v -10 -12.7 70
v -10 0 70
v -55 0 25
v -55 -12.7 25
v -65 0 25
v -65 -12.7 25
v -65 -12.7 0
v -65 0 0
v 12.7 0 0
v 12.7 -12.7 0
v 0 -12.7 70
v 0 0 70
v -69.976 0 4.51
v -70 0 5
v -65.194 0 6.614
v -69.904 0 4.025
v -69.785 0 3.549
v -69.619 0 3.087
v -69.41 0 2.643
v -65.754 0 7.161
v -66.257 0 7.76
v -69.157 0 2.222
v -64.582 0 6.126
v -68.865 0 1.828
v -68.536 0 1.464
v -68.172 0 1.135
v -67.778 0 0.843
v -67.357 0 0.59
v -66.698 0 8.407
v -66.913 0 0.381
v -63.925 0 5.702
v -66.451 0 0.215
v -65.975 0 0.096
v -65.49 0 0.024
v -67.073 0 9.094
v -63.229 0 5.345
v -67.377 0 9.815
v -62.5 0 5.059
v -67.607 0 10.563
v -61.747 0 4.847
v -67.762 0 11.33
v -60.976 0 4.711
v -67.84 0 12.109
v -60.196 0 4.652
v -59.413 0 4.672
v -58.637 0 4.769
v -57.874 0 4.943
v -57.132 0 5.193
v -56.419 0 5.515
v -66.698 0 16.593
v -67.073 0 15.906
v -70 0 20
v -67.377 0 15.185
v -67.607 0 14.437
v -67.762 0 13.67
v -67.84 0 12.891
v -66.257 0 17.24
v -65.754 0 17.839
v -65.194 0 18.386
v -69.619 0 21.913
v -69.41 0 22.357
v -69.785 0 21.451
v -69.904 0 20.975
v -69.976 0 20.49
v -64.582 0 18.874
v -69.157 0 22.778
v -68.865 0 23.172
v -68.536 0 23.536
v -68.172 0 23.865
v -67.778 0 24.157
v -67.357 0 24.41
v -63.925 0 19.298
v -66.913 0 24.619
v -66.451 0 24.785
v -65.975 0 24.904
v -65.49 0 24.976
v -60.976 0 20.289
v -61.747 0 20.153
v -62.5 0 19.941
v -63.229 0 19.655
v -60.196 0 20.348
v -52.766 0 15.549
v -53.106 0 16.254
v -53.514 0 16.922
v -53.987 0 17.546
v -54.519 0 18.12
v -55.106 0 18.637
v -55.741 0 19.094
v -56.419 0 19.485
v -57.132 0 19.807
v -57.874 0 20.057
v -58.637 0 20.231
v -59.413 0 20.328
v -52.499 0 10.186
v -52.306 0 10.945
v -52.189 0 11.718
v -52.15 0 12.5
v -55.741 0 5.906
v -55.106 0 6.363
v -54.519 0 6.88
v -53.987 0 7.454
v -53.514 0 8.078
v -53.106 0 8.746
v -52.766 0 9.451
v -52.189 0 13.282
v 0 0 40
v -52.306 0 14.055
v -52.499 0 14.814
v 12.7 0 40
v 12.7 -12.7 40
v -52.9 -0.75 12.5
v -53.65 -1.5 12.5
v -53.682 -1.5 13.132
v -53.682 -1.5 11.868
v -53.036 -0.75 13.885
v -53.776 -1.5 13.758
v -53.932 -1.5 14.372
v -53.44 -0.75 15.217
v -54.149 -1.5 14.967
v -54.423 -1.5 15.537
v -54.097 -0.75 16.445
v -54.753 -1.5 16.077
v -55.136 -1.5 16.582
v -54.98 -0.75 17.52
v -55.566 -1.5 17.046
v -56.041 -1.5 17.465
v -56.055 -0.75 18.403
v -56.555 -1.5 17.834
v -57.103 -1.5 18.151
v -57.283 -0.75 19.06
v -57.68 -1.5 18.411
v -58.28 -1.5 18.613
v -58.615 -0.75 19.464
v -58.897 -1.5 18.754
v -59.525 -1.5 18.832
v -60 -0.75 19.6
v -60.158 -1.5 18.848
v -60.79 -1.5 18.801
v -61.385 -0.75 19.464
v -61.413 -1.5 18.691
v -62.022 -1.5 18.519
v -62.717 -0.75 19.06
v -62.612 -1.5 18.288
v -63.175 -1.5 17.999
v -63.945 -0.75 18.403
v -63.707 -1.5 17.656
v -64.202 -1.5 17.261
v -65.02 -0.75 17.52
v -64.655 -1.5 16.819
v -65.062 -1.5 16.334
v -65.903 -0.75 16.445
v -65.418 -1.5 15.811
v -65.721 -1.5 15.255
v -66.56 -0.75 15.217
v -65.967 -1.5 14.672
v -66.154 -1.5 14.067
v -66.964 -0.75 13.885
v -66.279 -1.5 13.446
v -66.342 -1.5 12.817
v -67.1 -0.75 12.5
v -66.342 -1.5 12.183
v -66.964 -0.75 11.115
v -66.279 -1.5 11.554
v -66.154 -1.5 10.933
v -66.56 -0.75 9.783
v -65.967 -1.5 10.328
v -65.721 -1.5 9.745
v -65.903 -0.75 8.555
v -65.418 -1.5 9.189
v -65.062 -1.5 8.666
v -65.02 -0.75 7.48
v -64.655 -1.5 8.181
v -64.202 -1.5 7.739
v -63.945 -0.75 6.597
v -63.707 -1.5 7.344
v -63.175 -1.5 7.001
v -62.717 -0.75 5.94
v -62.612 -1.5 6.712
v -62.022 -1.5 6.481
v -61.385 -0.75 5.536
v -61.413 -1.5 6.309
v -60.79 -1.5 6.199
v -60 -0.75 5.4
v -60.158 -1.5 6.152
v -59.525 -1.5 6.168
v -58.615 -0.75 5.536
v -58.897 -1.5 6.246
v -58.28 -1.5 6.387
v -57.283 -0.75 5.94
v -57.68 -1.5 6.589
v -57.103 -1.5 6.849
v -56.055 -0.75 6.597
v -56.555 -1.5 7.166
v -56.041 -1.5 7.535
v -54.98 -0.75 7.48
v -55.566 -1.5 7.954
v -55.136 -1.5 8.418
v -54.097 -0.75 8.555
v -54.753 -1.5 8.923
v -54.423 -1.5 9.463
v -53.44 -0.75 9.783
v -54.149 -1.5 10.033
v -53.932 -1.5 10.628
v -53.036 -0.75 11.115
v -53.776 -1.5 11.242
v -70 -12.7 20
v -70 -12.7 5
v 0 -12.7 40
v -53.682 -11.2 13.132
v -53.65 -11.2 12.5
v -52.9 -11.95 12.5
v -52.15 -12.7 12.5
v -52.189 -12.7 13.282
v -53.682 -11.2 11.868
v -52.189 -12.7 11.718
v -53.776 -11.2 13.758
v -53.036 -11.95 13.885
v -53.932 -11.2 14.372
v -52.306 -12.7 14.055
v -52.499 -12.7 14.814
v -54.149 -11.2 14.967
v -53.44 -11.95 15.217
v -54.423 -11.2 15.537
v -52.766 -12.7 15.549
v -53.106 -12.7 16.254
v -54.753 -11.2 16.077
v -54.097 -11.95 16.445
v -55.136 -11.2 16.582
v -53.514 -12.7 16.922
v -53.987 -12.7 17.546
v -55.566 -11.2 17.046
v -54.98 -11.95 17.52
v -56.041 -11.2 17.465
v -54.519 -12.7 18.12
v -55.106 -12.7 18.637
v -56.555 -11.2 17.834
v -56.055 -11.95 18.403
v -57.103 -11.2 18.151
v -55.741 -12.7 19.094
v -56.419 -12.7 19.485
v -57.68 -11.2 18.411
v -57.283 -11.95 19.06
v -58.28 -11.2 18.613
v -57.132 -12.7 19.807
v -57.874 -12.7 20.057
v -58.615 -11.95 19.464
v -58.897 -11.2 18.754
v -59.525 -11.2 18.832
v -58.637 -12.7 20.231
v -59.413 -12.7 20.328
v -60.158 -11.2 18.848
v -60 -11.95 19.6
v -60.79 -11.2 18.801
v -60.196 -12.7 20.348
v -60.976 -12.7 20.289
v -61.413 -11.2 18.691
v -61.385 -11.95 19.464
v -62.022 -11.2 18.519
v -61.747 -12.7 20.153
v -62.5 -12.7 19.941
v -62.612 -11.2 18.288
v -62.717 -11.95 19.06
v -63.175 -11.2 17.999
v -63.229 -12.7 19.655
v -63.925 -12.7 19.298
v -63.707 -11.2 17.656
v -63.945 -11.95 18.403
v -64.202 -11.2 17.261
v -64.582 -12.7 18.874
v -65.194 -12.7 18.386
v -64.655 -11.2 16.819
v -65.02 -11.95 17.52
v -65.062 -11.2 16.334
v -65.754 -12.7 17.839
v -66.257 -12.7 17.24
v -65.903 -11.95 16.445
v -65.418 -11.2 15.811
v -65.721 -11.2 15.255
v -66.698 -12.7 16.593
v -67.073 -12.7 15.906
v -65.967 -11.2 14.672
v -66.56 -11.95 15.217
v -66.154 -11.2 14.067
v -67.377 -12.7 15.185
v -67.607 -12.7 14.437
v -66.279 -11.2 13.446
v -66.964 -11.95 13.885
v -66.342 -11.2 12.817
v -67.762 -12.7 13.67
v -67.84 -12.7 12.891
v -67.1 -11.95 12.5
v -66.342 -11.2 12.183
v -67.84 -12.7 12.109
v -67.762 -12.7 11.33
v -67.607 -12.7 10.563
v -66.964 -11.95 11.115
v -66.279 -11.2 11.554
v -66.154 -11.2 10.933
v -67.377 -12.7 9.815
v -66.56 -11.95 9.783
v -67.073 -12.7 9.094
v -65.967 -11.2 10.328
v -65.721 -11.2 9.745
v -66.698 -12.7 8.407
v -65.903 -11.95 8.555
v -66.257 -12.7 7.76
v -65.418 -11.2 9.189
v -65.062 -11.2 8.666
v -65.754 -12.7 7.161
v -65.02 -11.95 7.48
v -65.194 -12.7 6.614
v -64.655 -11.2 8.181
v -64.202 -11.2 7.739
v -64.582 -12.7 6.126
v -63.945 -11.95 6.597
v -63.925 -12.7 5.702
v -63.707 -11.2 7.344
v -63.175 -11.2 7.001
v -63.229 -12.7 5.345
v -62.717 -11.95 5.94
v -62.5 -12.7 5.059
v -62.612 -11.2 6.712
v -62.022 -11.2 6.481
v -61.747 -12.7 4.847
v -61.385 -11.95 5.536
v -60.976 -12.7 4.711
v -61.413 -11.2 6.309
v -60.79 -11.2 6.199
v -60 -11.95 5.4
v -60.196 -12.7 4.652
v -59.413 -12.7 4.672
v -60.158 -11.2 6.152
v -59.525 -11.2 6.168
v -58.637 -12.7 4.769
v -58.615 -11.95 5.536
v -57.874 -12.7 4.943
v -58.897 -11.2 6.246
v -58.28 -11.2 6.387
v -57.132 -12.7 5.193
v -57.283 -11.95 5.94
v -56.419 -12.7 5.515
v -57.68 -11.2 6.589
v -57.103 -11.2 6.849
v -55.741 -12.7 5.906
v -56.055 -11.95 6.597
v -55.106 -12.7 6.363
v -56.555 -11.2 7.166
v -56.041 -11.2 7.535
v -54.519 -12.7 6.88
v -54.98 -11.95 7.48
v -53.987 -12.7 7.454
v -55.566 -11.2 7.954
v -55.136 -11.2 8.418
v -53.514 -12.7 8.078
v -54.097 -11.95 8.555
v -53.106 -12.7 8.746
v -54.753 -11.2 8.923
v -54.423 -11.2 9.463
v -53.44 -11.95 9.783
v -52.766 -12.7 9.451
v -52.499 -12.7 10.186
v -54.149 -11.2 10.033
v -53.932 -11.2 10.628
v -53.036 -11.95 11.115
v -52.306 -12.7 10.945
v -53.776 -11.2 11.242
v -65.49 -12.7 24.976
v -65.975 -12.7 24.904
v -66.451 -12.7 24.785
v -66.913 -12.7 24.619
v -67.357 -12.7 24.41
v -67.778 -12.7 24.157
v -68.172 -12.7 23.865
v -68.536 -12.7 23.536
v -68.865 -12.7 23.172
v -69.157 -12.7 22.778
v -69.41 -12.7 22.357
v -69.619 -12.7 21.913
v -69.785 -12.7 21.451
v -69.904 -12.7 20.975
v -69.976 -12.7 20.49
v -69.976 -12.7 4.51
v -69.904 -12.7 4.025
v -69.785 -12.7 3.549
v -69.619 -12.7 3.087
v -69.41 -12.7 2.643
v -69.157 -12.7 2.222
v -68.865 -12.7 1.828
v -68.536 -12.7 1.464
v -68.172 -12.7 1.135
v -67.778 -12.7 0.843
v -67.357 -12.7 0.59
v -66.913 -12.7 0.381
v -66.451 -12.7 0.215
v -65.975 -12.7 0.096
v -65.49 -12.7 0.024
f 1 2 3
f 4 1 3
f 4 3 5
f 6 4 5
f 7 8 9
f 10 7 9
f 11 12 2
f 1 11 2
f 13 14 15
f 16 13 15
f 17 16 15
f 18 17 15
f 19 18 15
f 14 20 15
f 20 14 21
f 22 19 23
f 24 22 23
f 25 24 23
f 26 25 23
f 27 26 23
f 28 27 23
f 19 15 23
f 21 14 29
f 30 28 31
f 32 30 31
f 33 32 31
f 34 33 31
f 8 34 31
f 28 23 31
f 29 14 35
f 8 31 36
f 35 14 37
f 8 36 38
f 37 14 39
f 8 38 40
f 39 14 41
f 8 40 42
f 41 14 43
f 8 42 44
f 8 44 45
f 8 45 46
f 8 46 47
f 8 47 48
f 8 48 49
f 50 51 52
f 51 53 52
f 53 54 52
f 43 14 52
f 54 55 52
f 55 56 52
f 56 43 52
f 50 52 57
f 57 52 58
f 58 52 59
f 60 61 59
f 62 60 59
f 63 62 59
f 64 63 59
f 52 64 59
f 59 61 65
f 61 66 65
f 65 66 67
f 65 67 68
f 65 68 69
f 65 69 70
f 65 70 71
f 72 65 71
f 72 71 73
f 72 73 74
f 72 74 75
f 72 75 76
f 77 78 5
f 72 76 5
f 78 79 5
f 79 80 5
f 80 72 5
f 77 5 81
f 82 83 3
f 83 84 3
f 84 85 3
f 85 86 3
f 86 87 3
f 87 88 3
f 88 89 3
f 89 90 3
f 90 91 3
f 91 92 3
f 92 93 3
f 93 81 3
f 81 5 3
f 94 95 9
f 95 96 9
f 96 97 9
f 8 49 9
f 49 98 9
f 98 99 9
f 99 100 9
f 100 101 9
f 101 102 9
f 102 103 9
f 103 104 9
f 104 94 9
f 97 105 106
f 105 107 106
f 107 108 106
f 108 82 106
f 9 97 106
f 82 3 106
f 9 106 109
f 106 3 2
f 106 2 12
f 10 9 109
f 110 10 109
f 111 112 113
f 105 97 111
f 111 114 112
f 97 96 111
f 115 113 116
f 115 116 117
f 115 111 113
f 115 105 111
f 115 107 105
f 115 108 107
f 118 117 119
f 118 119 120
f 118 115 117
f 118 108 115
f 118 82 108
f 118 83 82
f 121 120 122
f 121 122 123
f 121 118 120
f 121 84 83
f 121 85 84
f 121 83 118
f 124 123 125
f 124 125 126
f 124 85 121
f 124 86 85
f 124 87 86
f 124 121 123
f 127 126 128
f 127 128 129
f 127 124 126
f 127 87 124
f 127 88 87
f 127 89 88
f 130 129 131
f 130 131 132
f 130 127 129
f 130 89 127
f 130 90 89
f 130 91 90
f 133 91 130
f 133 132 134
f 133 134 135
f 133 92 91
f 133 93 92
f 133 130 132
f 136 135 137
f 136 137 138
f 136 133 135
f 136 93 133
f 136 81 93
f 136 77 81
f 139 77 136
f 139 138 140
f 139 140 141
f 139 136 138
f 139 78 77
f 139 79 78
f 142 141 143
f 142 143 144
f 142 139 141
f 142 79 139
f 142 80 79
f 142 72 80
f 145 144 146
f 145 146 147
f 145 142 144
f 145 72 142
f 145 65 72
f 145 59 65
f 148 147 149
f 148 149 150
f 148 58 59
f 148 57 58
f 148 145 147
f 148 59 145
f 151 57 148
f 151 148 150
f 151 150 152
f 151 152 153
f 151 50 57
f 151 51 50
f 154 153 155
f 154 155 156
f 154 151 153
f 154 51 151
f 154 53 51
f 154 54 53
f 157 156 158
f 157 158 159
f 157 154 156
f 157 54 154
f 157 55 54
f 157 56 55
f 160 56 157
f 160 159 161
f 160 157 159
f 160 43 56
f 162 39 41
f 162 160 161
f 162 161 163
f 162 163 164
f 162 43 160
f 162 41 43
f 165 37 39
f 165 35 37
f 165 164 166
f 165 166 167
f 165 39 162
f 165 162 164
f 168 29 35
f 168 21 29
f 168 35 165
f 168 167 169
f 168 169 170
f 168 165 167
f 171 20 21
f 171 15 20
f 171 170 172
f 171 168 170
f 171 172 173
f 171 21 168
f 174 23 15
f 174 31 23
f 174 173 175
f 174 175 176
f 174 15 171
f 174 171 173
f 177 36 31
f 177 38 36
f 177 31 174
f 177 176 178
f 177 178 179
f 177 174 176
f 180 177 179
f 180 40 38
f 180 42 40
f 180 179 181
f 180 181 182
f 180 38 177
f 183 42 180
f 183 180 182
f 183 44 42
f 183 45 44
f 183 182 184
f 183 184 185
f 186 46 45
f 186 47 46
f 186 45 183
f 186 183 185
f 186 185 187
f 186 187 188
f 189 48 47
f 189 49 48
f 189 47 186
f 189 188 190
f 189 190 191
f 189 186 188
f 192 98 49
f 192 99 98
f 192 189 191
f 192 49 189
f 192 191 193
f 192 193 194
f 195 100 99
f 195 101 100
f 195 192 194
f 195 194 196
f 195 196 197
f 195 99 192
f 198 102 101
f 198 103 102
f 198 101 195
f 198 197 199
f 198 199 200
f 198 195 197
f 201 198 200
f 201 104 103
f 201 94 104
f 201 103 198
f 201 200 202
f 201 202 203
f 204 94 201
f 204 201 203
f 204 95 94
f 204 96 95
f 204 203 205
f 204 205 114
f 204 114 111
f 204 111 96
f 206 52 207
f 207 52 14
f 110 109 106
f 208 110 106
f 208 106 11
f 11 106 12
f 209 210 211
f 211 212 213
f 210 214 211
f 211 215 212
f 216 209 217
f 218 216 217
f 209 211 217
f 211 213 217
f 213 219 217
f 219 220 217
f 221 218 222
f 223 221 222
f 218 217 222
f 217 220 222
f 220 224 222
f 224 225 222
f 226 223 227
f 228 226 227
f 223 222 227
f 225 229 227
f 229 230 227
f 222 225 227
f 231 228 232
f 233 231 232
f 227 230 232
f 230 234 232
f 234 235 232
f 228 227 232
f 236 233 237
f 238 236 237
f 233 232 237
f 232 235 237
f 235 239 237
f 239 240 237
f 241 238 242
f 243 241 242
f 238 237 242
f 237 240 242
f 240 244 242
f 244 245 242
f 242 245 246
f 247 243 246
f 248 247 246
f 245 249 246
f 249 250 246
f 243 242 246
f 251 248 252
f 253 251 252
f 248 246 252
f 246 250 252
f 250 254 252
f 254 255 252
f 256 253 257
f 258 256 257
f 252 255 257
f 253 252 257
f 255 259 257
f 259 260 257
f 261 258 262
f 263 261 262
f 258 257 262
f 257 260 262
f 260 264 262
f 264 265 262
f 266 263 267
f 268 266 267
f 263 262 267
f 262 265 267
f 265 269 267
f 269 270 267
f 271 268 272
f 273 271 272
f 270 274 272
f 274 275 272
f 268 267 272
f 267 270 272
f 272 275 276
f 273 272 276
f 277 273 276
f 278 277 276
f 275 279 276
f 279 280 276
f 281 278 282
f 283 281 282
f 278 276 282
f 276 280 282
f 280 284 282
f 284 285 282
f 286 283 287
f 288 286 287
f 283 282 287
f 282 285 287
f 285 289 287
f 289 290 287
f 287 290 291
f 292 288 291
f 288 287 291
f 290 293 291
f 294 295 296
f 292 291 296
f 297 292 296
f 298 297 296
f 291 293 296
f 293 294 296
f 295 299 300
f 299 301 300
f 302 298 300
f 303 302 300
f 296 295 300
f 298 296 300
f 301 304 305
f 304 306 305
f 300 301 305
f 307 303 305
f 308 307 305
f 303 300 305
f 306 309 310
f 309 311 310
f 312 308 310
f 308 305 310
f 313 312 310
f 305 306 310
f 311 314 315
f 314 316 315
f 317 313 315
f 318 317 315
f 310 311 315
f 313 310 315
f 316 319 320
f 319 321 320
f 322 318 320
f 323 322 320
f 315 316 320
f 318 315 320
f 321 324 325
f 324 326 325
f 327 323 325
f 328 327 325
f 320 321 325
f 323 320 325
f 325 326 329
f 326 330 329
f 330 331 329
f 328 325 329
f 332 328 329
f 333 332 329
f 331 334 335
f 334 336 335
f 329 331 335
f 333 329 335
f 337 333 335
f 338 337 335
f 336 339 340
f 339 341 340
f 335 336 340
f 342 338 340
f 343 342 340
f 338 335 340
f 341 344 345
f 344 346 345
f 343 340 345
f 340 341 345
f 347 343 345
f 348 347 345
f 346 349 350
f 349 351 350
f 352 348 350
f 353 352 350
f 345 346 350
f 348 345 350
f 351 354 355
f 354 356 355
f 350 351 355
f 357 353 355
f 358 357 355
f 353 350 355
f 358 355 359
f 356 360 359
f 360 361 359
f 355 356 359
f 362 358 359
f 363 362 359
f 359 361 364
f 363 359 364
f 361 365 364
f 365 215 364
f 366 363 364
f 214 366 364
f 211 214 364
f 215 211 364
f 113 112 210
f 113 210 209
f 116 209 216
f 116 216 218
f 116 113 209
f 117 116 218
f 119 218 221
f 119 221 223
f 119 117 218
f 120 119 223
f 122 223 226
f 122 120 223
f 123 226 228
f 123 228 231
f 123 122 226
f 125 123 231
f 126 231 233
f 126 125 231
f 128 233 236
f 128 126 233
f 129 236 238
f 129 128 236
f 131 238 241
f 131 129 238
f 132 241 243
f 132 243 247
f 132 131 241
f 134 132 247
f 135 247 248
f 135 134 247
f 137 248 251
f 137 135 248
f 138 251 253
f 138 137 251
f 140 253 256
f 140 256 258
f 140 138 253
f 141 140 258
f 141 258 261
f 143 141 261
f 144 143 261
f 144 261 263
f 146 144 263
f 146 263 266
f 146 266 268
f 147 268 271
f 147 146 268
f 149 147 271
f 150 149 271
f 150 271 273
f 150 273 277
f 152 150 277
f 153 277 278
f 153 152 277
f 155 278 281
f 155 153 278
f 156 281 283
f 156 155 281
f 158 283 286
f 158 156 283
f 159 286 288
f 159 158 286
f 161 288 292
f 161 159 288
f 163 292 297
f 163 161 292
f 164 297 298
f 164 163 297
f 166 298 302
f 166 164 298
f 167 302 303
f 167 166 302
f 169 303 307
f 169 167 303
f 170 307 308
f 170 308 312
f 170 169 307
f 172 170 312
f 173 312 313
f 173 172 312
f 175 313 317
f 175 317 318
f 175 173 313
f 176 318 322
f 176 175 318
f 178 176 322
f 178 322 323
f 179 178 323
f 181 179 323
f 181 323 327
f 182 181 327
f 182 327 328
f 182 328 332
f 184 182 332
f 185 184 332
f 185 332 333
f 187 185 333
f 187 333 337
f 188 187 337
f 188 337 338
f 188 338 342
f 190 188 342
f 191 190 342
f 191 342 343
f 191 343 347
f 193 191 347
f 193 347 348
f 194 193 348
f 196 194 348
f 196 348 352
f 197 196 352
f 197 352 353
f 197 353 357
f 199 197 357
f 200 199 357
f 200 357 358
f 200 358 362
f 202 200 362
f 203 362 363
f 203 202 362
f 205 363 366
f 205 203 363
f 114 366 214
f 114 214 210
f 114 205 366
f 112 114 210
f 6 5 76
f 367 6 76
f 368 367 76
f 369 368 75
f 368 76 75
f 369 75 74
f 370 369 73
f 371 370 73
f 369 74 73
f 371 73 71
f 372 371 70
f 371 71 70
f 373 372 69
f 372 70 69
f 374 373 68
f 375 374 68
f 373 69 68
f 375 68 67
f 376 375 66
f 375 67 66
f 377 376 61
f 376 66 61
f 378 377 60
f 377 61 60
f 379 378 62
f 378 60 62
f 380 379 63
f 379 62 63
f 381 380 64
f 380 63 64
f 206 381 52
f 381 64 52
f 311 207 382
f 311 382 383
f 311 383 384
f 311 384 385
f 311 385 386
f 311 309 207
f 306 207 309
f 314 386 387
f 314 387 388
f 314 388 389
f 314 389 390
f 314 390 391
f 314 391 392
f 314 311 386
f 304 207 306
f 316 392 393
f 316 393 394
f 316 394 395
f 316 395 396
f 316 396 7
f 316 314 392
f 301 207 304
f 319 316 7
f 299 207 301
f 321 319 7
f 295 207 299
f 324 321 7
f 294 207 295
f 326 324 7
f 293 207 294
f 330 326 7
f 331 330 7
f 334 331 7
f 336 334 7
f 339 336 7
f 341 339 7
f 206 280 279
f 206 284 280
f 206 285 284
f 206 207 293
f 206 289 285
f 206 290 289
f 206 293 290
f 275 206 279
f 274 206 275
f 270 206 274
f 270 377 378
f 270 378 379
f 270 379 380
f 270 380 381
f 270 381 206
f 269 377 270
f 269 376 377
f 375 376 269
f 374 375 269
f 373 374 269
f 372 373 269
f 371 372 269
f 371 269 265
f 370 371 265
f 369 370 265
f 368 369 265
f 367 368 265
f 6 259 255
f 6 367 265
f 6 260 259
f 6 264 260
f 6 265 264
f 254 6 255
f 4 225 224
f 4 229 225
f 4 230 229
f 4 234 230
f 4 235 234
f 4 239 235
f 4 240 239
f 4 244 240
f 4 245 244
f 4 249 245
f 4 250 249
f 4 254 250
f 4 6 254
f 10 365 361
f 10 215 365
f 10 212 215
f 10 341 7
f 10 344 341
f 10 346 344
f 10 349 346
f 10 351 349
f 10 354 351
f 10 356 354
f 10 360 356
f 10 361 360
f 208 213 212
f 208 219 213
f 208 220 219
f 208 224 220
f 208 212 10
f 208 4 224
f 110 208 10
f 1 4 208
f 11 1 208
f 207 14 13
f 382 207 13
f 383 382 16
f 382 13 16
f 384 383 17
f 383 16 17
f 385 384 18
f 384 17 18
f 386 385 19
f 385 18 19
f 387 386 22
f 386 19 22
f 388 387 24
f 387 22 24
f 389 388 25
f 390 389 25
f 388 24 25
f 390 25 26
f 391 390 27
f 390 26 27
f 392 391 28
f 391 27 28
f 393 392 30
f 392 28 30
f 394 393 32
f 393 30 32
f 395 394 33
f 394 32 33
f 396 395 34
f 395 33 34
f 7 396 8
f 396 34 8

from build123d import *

# Parameters (mm, degrees)
F0_R     = 6.35
F1_DEPTH = 12.7
F2_SIZE  = 1.5


with BuildPart() as f1:
    # F0 (on Front) → F1 (new body)
    with BuildSketch(Plane.XZ):
        with BuildLine():
            Line((-70, 20), (-70, 5))
            ThreePointArc((-70, 5), (-68.535534, 1.464466), (-65, 0))
            Line((-65, 0), (12.7, 0))
            Line((12.7, 0), (12.7, 40))
            Line((12.7, 40), (0, 40))
            Line((0, 40), (0, 70))
            Line((0, 70), (-10, 70))
            Line((-10, 70), (-55, 25))
            Line((-55, 25), (-65, 25))
            ThreePointArc((-65, 25), (-68.535534, 23.535534), (-70, 20))
        make_face()
        with Locations((-60, 12.5)):
            Circle(F0_R, mode=Mode.SUBTRACT)
    extrude(amount=F1_DEPTH)

    # F2
    f2_edges = [f1.edges().sort_by_distance(p)[0] for p in [
        (-66.35, 0, 12.5),
        (-66.35, -12.7, 12.5),
    ]]
    chamfer(f2_edges, length=F2_SIZE)


solid = f1.part
